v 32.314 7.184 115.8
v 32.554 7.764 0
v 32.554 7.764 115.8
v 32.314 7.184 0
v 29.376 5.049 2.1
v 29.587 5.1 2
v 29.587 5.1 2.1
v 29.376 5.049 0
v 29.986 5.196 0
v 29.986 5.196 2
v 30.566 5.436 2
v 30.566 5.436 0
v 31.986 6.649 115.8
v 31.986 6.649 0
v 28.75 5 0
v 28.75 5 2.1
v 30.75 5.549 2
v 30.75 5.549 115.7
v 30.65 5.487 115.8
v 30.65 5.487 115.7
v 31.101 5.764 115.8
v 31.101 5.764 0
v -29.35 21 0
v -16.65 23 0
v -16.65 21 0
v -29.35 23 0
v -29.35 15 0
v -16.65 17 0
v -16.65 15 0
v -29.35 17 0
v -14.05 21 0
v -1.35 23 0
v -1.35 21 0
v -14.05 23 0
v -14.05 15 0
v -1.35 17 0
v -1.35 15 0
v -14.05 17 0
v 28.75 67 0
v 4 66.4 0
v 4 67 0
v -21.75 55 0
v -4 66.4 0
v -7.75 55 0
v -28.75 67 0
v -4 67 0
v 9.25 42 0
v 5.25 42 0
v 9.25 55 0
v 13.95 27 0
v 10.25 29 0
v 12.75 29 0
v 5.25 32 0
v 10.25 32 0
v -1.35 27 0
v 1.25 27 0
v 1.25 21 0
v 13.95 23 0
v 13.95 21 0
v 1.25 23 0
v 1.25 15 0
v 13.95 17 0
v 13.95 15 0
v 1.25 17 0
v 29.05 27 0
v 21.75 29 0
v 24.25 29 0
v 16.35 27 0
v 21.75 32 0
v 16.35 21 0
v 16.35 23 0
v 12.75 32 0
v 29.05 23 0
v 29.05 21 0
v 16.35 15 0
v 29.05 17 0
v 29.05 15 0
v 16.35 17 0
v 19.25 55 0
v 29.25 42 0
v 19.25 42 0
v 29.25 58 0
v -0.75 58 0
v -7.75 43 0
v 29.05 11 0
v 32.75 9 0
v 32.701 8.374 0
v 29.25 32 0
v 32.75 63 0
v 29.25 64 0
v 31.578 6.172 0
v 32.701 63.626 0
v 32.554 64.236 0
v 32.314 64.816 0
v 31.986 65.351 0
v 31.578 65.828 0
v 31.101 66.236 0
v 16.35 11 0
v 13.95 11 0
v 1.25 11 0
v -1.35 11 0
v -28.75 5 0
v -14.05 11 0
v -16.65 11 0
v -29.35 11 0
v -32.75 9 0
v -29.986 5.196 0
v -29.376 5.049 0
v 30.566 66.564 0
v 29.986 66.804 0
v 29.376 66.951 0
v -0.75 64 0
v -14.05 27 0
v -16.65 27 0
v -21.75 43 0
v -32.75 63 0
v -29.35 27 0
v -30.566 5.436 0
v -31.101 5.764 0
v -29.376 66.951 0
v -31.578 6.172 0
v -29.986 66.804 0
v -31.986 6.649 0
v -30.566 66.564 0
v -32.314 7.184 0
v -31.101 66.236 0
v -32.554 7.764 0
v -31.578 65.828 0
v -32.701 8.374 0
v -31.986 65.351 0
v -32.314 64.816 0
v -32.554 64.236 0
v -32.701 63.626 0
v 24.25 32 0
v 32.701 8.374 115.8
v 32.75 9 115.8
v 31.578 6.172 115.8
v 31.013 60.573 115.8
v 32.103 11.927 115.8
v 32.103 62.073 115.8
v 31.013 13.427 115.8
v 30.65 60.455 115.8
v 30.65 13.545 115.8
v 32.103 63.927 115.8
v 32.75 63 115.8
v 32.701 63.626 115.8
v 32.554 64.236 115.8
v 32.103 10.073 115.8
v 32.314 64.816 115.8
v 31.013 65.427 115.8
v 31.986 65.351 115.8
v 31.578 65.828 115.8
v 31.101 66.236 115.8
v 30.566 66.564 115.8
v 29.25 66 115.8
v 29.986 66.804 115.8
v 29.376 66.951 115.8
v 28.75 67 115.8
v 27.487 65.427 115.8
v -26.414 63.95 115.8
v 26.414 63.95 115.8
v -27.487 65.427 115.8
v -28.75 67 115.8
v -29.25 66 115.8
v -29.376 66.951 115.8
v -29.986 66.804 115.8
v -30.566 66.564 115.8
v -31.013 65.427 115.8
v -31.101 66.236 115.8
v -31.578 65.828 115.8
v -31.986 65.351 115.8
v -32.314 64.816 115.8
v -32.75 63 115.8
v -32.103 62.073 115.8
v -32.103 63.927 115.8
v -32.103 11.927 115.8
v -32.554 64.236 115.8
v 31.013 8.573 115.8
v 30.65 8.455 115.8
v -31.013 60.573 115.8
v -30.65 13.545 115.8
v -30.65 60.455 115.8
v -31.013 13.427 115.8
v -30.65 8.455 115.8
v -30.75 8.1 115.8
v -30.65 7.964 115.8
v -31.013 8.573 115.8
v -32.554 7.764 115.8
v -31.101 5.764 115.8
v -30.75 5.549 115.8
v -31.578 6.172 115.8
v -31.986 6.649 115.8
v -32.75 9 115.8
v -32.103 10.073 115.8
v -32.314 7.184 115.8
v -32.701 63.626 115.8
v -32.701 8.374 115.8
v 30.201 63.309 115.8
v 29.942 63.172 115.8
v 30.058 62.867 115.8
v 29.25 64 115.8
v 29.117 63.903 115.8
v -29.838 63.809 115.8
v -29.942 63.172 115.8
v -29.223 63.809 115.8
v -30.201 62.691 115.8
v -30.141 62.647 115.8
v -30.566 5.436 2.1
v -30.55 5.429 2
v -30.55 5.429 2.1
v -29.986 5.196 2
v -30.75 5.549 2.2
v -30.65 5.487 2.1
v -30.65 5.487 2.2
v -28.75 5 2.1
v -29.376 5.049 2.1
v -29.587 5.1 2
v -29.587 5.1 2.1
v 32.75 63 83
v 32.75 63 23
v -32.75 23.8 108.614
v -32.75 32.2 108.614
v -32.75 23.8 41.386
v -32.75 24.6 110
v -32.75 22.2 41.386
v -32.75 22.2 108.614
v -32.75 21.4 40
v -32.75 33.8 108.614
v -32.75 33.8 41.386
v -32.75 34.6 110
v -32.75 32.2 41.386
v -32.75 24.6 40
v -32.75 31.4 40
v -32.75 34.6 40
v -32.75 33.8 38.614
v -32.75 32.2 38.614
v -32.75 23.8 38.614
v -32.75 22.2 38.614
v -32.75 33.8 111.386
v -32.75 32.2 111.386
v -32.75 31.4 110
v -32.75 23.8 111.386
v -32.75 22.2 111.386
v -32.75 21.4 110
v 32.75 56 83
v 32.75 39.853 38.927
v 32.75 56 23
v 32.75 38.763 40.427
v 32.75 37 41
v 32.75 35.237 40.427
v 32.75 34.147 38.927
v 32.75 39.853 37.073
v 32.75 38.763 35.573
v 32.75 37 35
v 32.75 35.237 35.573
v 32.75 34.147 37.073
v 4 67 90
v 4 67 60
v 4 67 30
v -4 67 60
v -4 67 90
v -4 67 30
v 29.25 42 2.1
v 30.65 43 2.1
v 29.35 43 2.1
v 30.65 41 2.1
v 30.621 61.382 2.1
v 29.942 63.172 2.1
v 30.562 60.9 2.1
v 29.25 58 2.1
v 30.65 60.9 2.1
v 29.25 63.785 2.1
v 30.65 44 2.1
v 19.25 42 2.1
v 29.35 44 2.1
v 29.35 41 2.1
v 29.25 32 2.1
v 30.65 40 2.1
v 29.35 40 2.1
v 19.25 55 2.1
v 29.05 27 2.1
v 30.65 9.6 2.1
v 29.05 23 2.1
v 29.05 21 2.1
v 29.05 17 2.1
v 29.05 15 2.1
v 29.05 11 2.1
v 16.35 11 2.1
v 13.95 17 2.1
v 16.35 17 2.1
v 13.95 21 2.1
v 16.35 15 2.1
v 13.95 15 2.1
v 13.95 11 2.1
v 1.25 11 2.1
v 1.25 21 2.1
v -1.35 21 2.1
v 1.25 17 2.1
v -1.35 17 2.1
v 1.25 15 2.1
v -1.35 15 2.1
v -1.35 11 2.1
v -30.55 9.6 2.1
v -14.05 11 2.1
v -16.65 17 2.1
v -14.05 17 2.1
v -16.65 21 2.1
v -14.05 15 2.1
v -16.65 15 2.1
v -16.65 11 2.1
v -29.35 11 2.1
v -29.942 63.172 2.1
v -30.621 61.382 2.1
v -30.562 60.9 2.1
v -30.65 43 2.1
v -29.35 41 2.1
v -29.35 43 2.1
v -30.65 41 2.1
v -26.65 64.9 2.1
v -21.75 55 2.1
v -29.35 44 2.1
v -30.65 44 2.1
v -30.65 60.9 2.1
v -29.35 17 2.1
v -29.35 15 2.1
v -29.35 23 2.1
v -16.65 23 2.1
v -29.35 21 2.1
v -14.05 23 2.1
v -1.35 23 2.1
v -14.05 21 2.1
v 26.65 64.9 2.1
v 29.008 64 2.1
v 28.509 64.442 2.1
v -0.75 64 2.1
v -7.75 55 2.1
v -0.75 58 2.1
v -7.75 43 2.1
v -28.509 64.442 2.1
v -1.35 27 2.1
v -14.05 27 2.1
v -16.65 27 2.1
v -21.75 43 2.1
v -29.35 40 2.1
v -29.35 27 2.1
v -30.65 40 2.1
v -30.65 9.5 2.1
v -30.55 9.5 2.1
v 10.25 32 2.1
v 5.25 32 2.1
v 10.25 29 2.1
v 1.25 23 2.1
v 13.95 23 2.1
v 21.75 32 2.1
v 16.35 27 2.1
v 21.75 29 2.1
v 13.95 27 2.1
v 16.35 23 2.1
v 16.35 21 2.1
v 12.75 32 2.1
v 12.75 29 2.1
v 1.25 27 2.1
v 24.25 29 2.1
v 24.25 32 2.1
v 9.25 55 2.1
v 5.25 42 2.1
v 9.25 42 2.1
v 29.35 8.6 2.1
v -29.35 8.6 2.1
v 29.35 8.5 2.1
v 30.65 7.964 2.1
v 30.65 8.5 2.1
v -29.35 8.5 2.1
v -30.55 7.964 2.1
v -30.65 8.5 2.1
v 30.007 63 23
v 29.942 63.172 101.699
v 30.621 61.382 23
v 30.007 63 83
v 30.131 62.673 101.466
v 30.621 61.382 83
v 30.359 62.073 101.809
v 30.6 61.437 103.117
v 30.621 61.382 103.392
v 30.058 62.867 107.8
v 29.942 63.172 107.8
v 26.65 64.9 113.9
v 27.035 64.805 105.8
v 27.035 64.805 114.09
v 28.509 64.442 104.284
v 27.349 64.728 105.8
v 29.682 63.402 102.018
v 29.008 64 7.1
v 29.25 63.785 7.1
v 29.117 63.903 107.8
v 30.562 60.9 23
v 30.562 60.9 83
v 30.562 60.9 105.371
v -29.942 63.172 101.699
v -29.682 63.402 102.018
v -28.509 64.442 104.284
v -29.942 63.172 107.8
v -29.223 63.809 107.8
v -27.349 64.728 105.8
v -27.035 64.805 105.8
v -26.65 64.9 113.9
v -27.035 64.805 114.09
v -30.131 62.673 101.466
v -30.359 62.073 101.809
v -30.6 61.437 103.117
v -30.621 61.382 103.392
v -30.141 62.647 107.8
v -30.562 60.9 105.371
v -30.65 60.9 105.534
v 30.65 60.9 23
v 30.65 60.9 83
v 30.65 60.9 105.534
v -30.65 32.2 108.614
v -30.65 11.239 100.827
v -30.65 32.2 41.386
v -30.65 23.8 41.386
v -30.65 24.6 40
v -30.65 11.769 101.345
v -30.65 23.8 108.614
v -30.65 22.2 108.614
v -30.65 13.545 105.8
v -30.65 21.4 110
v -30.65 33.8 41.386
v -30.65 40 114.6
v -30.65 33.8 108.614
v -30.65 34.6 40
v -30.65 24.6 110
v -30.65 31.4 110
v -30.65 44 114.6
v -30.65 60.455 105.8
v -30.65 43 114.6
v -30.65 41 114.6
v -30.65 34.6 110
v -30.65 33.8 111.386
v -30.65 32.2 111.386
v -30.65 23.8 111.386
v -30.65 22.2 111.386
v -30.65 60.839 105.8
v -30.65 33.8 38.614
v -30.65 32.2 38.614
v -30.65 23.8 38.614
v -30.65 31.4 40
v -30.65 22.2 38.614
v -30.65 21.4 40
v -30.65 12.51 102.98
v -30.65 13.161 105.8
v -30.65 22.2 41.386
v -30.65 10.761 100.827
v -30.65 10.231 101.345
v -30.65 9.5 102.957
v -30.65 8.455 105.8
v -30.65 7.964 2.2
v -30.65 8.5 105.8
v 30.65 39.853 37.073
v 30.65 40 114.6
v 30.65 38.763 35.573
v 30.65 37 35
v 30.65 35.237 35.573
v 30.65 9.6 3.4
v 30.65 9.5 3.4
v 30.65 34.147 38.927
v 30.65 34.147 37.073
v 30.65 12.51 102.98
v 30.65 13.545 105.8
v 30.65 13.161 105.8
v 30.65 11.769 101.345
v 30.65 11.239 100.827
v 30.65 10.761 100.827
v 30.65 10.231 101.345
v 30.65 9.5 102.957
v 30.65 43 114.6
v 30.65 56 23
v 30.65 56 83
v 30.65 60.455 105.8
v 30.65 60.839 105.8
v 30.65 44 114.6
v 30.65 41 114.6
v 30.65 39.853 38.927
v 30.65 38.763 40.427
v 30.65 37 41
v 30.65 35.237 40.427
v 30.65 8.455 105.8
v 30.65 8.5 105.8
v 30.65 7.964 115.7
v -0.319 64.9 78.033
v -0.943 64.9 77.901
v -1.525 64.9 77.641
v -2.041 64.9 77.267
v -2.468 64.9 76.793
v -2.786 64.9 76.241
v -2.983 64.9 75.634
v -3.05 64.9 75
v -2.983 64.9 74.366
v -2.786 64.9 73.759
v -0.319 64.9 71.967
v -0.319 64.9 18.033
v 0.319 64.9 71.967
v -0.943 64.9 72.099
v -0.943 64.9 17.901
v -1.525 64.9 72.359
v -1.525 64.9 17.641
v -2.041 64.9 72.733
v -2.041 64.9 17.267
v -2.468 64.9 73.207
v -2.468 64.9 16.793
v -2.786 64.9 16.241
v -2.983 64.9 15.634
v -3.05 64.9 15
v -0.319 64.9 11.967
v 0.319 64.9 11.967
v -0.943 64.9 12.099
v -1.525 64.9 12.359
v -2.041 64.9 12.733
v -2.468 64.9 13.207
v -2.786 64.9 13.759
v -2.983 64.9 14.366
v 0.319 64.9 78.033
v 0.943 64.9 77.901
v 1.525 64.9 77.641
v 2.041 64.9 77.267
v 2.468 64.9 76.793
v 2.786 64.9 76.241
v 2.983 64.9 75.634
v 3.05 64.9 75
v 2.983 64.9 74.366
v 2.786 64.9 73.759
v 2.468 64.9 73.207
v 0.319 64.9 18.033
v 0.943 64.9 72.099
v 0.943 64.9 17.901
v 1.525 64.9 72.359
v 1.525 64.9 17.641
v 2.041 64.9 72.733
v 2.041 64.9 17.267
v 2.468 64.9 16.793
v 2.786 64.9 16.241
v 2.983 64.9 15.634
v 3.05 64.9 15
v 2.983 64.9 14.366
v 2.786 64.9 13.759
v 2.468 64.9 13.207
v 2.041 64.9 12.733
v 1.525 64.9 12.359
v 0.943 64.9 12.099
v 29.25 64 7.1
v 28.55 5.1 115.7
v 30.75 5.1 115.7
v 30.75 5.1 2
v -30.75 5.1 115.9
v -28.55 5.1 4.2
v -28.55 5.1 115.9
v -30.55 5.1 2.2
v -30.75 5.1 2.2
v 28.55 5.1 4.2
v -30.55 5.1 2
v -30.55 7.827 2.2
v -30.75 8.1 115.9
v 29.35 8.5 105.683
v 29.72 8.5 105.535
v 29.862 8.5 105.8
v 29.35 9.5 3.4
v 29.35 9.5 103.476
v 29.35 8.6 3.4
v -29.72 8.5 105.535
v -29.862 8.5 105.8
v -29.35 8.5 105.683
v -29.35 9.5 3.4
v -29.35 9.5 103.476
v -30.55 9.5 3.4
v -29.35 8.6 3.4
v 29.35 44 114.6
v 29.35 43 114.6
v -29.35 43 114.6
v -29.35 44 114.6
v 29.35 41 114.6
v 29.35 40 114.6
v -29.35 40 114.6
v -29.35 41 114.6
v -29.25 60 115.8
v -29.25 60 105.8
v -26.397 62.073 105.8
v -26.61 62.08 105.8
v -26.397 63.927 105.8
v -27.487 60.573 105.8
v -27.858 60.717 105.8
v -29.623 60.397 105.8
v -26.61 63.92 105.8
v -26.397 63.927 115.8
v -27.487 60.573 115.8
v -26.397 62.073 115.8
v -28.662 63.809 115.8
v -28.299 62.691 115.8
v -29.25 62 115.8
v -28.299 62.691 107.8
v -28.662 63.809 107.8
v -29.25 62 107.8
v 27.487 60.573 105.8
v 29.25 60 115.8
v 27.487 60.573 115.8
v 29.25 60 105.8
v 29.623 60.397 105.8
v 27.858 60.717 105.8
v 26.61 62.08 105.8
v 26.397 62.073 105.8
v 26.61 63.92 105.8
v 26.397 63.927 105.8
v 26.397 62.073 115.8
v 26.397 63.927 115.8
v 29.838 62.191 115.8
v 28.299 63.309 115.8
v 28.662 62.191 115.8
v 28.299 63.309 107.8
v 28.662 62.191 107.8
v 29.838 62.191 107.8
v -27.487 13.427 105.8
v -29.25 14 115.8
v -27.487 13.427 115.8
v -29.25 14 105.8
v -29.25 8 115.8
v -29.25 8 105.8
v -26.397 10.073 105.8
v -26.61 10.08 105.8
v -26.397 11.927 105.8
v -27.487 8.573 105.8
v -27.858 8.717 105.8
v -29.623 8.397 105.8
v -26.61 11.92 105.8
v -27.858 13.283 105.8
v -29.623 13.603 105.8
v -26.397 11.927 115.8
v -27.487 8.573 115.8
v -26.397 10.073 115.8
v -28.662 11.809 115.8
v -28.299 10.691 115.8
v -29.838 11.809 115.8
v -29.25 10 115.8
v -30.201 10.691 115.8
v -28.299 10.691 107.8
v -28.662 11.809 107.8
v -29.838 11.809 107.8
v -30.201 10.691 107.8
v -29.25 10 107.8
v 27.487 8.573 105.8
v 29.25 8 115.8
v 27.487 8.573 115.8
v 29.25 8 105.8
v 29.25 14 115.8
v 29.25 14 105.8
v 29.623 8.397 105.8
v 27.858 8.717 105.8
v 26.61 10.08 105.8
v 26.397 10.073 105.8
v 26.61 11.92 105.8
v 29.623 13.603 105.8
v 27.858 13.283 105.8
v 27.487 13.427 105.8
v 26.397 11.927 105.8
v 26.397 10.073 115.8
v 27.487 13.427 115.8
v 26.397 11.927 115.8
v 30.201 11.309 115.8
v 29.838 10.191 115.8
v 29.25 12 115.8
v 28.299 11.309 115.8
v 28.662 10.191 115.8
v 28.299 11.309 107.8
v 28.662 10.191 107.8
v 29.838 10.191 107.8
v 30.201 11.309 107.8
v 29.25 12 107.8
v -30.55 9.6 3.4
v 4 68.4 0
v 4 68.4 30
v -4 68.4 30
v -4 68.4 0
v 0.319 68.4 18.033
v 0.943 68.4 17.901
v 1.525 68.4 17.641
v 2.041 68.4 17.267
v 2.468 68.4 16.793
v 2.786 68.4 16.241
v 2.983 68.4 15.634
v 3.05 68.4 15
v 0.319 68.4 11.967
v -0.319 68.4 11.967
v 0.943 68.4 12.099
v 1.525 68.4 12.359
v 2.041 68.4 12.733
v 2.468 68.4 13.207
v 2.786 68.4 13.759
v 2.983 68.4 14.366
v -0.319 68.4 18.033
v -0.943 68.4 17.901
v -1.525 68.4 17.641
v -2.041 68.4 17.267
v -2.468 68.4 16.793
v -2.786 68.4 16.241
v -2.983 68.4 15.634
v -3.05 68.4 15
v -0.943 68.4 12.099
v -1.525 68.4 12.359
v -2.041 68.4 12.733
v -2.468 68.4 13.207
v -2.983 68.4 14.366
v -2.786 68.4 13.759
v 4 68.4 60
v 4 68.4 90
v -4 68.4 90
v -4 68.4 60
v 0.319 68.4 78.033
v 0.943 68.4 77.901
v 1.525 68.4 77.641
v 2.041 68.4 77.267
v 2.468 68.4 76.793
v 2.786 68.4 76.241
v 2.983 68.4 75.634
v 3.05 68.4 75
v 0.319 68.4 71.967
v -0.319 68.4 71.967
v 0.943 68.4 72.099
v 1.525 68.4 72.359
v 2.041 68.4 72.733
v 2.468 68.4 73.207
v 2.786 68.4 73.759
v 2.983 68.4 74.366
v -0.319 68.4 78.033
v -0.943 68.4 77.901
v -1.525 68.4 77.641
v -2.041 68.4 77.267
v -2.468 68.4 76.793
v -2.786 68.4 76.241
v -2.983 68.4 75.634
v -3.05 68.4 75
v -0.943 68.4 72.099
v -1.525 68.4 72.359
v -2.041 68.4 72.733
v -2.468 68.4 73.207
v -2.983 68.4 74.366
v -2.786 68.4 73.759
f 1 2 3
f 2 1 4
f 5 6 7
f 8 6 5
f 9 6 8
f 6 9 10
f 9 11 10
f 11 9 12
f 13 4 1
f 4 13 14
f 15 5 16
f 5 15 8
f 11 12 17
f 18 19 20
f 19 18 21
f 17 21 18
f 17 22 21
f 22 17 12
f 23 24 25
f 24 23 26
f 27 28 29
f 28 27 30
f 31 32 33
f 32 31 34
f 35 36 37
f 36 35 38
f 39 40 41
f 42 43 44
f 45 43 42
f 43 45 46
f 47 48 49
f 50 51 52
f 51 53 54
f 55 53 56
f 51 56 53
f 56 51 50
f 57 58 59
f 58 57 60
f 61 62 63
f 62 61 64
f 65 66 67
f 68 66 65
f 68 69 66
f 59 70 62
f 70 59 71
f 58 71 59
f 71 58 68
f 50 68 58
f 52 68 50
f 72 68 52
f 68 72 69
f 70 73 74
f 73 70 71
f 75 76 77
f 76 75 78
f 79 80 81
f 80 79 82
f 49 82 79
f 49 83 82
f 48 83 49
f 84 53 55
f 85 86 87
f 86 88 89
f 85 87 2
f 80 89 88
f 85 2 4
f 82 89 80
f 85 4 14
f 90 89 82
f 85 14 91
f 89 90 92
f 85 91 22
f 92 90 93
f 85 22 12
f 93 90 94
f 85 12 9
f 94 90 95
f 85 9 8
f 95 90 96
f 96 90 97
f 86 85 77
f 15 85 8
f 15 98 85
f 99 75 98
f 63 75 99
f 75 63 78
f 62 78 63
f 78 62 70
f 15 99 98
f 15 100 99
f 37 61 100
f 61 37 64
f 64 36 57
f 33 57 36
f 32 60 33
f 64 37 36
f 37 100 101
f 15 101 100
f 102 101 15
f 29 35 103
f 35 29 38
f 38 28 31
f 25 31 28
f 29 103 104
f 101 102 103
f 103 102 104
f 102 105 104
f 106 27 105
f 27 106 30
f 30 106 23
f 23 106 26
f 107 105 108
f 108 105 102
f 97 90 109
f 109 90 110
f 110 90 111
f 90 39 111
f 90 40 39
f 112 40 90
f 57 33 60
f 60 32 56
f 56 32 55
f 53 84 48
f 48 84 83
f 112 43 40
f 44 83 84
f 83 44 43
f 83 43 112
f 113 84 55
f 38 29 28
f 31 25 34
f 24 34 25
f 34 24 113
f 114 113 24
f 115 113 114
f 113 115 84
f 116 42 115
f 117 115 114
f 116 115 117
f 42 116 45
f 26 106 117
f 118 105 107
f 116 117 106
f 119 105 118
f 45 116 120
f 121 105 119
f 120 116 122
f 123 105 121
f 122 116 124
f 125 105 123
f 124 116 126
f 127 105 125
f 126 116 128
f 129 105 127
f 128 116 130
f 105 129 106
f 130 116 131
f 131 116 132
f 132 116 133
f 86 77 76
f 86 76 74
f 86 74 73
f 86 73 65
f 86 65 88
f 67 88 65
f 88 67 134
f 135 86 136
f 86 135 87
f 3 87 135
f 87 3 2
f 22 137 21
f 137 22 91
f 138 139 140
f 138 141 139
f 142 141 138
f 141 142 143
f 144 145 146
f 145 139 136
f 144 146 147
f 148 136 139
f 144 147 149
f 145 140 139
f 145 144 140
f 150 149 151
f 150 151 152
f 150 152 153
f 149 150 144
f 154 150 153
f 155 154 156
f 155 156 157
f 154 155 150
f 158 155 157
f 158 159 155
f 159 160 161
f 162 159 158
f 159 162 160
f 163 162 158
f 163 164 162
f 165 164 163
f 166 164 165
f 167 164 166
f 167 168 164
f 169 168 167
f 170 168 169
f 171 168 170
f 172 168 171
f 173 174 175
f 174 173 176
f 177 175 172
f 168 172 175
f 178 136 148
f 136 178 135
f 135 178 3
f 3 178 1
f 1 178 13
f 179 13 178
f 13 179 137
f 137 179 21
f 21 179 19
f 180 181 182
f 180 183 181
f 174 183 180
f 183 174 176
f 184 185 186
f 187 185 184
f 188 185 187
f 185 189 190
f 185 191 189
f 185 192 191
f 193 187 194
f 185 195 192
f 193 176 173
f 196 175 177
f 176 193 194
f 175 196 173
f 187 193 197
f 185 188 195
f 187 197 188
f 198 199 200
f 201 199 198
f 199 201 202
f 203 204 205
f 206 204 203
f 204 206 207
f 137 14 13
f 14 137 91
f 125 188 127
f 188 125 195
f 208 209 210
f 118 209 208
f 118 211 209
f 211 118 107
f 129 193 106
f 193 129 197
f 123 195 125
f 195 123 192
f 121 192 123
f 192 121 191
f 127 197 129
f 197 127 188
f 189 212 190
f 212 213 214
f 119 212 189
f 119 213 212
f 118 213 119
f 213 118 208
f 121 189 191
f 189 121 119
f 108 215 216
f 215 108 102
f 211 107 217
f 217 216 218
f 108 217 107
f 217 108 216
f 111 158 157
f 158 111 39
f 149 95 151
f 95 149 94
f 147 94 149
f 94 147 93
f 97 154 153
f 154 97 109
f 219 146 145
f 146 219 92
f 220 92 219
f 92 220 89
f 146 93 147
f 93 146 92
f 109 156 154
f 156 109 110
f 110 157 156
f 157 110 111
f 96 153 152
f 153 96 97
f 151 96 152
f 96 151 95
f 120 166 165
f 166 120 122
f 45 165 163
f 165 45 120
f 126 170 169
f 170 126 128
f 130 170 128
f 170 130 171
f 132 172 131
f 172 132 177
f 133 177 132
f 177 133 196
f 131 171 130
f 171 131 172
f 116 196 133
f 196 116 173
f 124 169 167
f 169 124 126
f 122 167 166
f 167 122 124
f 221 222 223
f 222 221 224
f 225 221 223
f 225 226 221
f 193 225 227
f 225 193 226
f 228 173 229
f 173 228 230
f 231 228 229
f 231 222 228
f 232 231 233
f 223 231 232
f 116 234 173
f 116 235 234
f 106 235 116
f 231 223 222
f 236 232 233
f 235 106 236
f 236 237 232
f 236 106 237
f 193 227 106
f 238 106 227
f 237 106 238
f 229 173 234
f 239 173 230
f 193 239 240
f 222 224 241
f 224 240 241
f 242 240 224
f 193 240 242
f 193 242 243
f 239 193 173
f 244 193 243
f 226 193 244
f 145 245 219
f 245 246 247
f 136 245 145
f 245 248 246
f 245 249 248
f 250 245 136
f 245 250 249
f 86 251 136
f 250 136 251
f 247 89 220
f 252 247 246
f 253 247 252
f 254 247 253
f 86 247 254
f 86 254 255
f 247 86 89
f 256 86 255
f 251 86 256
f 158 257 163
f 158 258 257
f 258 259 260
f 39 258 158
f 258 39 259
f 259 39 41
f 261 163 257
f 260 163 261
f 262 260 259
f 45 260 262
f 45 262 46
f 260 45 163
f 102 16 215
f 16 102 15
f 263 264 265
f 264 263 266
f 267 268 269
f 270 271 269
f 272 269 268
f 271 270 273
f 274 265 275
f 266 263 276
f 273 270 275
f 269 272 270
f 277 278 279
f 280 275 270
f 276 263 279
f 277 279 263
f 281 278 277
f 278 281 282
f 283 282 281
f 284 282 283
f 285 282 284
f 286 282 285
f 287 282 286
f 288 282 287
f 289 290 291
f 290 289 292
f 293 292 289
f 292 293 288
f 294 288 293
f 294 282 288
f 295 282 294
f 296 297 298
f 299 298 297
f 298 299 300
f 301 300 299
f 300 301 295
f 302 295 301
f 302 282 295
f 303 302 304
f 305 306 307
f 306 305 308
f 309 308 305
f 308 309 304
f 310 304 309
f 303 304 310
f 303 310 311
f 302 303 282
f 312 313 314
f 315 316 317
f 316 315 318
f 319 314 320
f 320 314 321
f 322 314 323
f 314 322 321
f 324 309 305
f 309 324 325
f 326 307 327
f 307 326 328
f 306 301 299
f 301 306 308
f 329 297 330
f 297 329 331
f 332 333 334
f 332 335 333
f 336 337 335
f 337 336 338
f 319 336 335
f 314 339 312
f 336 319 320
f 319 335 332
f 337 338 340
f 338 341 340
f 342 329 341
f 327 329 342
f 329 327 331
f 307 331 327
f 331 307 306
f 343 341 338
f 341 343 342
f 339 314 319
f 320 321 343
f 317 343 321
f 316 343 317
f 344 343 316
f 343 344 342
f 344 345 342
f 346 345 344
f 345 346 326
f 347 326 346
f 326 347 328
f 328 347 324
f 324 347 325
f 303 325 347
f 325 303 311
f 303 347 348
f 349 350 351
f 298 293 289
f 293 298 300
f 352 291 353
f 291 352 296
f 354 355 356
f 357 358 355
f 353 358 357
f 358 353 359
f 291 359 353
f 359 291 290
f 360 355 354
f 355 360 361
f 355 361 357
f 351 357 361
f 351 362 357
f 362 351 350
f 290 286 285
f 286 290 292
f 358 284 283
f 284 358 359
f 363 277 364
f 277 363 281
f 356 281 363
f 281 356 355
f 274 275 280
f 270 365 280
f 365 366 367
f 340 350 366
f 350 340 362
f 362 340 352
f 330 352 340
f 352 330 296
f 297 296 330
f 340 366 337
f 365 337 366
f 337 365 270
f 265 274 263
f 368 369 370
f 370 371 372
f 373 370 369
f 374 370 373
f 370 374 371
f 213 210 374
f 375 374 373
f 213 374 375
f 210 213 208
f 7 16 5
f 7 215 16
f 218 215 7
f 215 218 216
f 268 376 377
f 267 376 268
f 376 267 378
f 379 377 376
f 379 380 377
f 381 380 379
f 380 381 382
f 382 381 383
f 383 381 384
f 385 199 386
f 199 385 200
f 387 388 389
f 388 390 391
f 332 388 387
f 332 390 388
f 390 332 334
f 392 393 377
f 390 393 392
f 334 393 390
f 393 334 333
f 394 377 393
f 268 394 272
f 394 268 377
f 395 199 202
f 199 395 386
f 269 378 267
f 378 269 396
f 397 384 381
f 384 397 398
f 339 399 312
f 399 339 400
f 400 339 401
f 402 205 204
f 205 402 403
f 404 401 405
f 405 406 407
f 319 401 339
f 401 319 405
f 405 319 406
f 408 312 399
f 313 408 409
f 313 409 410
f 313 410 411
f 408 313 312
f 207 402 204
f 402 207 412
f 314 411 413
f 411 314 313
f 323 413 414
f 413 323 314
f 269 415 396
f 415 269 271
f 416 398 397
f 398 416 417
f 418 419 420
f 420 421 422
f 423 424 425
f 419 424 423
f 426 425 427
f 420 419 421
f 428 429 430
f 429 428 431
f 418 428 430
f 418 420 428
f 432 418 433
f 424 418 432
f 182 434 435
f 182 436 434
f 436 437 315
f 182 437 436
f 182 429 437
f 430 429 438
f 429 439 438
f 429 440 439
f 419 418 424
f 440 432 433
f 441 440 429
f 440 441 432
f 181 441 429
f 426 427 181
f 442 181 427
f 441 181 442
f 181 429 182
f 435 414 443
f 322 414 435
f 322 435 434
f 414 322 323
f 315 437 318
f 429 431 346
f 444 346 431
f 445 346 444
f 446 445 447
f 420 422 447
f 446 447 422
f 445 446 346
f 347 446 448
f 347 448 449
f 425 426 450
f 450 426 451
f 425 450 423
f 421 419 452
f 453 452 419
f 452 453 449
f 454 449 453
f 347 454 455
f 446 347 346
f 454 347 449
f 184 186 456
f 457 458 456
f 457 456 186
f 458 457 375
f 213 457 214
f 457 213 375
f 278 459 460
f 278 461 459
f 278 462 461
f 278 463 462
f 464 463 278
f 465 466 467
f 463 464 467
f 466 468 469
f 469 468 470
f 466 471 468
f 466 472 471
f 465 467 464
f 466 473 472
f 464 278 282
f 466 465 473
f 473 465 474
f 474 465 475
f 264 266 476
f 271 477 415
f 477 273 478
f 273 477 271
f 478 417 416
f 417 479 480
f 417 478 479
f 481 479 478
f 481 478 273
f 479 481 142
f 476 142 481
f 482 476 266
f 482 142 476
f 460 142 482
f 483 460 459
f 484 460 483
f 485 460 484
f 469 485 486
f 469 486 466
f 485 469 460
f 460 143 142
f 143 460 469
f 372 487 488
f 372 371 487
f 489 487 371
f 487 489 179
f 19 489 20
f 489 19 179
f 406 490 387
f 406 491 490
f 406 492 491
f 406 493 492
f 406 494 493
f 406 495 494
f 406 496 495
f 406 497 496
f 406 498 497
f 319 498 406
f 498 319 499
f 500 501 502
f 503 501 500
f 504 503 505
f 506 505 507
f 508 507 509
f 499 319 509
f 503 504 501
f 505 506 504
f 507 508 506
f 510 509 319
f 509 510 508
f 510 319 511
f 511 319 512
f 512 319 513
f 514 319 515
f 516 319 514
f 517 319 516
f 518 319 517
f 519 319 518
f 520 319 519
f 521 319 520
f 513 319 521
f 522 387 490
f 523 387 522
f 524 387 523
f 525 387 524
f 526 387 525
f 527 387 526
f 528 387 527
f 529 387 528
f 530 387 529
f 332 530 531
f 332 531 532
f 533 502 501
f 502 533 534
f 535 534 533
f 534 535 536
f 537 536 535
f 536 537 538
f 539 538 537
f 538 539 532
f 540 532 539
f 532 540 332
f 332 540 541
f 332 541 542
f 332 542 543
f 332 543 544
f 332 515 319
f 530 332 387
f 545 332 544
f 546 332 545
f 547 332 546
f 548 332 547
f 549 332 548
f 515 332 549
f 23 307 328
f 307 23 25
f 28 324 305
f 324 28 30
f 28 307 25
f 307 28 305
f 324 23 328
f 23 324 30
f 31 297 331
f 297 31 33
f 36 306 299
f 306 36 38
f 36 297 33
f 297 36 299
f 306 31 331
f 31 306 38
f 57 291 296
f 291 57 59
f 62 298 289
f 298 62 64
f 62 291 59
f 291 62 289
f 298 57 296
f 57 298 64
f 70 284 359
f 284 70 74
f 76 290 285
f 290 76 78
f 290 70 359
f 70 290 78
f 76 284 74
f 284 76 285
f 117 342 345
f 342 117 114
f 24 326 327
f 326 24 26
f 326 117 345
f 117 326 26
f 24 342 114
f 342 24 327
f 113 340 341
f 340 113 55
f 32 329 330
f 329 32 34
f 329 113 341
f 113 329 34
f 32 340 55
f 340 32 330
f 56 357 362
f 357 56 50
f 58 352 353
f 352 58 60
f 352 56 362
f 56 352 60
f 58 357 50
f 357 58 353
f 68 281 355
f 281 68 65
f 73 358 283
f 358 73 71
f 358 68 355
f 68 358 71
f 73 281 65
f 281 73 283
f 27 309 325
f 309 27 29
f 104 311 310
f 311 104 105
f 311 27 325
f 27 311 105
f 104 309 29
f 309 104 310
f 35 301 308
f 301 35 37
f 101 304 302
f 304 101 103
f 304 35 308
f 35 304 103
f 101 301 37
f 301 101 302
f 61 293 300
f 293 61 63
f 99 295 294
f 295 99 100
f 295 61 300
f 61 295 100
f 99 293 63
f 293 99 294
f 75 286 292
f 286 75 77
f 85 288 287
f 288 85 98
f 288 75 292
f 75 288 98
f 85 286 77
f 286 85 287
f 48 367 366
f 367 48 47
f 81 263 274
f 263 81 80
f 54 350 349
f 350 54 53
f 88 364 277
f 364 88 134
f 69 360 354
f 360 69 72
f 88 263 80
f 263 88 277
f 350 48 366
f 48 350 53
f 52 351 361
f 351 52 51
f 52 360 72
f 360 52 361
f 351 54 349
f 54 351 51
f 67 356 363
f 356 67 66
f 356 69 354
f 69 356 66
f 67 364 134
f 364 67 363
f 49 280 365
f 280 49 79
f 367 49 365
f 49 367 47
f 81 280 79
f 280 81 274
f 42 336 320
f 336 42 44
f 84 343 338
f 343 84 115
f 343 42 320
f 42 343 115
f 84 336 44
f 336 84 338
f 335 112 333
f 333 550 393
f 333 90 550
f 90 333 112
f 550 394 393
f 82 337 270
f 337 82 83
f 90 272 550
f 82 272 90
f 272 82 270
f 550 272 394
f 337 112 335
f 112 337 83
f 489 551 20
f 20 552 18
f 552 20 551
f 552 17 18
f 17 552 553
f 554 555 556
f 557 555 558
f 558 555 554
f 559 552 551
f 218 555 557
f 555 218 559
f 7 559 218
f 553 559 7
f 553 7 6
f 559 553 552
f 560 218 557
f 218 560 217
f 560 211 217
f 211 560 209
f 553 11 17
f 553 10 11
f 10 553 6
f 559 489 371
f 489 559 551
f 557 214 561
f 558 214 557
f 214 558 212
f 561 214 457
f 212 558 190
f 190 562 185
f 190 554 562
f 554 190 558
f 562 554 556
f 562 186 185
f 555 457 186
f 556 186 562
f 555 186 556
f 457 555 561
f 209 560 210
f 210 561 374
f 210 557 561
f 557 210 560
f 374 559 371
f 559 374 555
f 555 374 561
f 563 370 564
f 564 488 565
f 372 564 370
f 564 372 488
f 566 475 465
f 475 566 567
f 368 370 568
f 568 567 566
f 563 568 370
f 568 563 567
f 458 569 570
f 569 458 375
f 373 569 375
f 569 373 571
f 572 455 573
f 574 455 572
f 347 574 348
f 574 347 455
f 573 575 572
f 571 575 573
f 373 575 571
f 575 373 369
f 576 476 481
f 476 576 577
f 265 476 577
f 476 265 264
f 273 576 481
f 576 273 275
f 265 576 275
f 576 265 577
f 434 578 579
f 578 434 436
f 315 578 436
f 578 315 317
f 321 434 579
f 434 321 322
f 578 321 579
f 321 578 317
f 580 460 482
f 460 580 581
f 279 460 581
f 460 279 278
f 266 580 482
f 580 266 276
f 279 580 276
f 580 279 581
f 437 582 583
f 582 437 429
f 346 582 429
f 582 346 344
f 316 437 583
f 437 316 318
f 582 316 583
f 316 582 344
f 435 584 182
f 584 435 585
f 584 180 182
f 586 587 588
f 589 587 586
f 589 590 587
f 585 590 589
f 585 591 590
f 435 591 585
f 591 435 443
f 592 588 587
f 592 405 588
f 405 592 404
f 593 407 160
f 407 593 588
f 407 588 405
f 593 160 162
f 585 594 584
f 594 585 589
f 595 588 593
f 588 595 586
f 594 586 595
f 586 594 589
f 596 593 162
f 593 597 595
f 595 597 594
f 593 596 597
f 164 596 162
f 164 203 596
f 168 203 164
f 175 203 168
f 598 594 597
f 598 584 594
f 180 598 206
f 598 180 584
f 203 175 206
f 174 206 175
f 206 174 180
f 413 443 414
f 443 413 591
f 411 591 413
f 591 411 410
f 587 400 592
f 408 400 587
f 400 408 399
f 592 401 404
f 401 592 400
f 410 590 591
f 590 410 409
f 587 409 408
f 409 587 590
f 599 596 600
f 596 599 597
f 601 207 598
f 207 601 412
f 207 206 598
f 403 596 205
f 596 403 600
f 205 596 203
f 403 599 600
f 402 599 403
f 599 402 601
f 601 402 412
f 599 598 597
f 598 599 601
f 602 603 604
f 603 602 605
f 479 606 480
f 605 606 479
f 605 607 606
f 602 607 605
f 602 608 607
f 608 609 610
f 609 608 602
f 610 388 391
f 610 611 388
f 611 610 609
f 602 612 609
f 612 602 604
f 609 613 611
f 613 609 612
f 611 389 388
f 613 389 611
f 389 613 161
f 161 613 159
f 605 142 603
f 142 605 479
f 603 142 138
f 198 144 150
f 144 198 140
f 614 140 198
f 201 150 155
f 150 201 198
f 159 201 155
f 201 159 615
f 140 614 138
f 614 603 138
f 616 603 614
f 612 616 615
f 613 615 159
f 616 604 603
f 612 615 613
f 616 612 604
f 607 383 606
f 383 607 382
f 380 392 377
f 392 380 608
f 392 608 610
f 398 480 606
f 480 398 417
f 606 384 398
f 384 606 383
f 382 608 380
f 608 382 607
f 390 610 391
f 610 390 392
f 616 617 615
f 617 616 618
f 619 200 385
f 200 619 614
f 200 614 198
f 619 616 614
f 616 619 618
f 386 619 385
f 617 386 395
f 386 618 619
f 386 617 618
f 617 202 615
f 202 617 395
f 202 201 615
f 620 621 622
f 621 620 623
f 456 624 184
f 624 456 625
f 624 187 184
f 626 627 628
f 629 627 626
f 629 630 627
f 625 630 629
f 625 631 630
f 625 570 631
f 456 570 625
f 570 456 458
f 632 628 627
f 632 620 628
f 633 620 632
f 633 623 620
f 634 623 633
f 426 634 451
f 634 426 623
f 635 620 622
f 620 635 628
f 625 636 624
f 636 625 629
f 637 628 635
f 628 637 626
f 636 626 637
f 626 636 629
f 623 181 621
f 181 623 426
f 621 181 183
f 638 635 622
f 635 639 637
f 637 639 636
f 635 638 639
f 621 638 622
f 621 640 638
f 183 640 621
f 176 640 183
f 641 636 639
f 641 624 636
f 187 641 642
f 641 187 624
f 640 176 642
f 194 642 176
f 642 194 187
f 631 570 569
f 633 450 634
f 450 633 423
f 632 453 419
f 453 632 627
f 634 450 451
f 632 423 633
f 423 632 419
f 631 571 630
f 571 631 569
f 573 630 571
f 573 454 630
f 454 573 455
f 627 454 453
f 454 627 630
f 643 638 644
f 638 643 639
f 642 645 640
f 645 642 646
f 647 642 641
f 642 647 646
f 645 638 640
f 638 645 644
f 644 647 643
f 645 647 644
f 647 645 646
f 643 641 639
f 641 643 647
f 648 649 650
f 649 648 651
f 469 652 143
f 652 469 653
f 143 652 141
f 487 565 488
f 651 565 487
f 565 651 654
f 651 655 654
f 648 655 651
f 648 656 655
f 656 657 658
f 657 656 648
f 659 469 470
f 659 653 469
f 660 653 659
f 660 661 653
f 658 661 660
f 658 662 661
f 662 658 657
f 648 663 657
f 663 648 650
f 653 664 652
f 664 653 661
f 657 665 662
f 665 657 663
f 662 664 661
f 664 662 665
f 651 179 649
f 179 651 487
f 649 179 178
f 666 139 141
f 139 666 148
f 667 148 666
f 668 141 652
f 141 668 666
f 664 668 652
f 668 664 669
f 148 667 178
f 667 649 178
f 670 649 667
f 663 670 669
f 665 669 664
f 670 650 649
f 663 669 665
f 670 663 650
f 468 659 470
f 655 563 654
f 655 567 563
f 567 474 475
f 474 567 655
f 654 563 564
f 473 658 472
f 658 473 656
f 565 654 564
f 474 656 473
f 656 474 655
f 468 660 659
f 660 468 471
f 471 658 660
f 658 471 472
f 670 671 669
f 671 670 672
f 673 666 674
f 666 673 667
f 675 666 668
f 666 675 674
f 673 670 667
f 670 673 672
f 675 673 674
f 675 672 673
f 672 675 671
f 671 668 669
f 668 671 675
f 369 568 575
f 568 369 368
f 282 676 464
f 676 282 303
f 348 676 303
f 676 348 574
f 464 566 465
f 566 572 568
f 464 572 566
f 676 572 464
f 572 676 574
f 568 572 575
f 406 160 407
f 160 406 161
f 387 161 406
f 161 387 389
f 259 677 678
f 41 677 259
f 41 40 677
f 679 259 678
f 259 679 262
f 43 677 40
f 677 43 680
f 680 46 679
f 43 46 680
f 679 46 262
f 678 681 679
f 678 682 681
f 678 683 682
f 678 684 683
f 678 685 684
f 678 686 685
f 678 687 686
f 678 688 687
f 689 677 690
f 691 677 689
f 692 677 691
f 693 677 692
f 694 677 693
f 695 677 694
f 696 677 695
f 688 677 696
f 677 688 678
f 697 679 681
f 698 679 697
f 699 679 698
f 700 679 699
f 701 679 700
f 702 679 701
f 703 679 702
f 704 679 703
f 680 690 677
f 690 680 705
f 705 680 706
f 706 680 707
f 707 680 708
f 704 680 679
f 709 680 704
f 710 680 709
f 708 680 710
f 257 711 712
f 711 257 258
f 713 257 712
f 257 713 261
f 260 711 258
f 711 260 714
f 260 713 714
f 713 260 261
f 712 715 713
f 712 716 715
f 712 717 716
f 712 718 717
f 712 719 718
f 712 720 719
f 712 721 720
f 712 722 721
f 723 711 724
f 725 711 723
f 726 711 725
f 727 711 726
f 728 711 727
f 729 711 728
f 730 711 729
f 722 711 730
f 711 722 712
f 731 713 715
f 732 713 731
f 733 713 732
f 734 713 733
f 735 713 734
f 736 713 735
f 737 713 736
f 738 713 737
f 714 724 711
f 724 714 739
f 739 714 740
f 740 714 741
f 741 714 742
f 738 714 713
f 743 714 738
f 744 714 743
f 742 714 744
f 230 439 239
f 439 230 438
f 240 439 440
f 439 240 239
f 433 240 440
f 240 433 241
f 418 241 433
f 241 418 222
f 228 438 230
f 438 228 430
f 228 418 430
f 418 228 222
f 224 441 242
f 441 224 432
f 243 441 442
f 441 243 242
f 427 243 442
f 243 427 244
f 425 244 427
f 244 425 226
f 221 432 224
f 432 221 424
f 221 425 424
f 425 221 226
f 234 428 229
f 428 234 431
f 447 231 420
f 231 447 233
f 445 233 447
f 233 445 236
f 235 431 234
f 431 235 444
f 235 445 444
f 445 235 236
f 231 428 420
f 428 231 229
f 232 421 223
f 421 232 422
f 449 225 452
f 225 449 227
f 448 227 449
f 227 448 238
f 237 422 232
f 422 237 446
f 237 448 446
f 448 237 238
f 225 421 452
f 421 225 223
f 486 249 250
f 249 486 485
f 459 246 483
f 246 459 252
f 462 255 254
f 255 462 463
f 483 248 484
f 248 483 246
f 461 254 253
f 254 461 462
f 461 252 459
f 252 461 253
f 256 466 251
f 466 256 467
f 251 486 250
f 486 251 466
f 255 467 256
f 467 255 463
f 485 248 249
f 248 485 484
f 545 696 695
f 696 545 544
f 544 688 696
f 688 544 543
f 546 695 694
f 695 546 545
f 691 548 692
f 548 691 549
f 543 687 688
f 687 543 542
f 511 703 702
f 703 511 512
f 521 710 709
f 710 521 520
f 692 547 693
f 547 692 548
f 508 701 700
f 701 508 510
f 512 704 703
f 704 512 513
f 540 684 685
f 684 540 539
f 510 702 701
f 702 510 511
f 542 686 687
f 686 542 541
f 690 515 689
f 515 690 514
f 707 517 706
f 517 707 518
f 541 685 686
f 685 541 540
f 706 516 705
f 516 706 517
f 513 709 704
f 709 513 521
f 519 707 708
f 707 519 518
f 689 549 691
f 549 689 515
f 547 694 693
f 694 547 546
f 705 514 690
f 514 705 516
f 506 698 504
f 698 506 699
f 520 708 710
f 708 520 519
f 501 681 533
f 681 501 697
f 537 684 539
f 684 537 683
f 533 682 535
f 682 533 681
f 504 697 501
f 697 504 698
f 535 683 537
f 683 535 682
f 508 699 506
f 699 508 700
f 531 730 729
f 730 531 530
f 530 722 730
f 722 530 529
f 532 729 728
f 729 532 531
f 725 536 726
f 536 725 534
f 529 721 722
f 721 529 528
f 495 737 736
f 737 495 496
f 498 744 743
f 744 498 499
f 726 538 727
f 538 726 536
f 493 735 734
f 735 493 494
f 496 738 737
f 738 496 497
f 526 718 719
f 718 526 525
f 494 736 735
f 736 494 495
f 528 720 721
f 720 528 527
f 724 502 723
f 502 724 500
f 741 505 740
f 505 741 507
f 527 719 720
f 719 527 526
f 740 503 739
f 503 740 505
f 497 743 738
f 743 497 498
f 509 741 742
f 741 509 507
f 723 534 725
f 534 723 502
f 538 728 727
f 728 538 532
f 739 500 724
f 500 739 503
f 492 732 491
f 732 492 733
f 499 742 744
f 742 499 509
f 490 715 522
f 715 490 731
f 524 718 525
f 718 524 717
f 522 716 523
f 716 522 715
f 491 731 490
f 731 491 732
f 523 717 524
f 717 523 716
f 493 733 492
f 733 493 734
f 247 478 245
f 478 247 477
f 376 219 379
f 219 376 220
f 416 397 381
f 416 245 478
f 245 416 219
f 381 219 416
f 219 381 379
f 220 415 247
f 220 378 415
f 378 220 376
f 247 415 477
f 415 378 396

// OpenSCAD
// Sliding Project box V1.2, now with screw holes!
// John Newman, 25th November 2011
// Edited by Martin Neruda (neruda@reprap4u.cz)

//
// A parameterised enclosure for electronic projects, with support for PCB slots, Screw holes and blocks
// and apertures in the lid and 'top' end.
// The lid slides on, which holds your PCB(s) in.
// Apertures are added with code in the modules "HoleInLid" and "HoleInEnd". See the comments.

// Outside dimensions of the box, and other structural dimensions

OutL = 120;		// Length in mm (puvodne 107)
OutW = 65.5 ; 	// Width in mm
OutD = 62	;		// Depth in mm
WallT = 2.1	;	// Wall thickness (mm)

// PCB supports are defined by the distance to the underside of the PCB, from the top external of the box.
// Supports for the PCB are ribs above and below
PCBgap = 2 ;	// Slot size for PCB to slide into
PCB1 = 38 ;		// Position of first PCB (0 if none)
PCB2 = 0;		// Position of second PCB (0 if none)
PCB3 = 0 ;		// Position of third PCB (0 if none)

// Screw fasteners are positioned by defining their centre , below the top external surface
// They will be positioned on either side at that height. You have to make sure they are not in a PCB slot!
Screws1 = 58 ;	// Position of screws
Screws2 = 6;	// Second set of screws
// Optionally specify the screw hole diameter, to have the holes 'printed'. Otherwise drill them...
ScrewH = 1.0 ;	// Screw hole diameter, in base
ScrewL = 0.0 ;	// Screw hole diameter, in lid

// More obscure parameters
BRad = 4 ;		// Radius of curvature, box edges (mm)
// For wide boxes (>50/60mm) you may want to use this, or make WallT larger for rigidity.
Ridge = 0.5;		// Depth of reinforcing ridge at end of base. 0 to suppress, is WallT multiplier. (not mm!) e.g 1.5

Sdepth = 1.0 ;	// Depth of support ribs for Lid and PCB (mm)
Swidth = 1.4;
// Bevelled ridge to hold lid on (in mm)
RHeight = 3 ;	// Top ridge height
RWidth = 2 ;	// Top ridge width (out over the box)
// Plastic blocks to screw into
ScrewD = 10 ;	// Depth of screw block (which the screw goes into)
ScrewW = 6 ;	// Width of Screw block, and of countersink in lid

Allow = 0.5;		// Allowance for fit of the lid. A gap around it, and elsewhere.


// *******************************  View / render options ********************************

// Print Box on on it's own
//translate([0,0,OutL/2-WallT]) rotate([0,-90,90]) pbox() ;  	// Rotate and position for printing

// Print Lid on it's own
//translate([0,0,OutD/2]) pboxlid() ;					// Rotate and position for printing


// Print both together (if they fit!)

//cover();
box();

module cover(){
difference(){
	union(){
		translate([0,-OutW/2-5,OutD/2]) pboxlid();
		translate([-OutL/2+2,-OutW+2,0]) cube([14,5,OutD-10]);		
	}
	translate([0,-9])union(){
		translate([-OutL/2-0.1,-13,OutD/2-20]) cube([10,10,20]);
		translate([-OutL/2-0.1,-13,OutD/2-10]) rotate([0,90,0])cylinder(h=10,r=10);
	}
}
}

module box(){
difference(){
	union(){
	translate([0,OutD/2+5,OutL/2-WallT]) rotate([0,-90,90]) pbox();
	translate([-4,OutD+2*WallT+0.2,0]) cube([8,2,30]);
	translate([-4,OutD+2*WallT+0.2,60]) cube([8,2,30]);
	}
	union(){
	  // Reset hole
	  translate([OutW/2-6,37,38]) rotate([0,90,0]) cylinder(h=10,r=3);
	  // Holes for Arduino Mega2560
	  translate([-OutW/2+6,OutD+6,0]) rotate([90,0,0]){
	  // Holes for zip ties
	  translate([-10,110,35]) rotate([0,90,0])
	  cylinder(h=10,r=1.6);
	  translate([-10,110,45]) rotate([0,90,0])
	  cylinder(h=10,r=1.6);
	  translate([-10,40,35]) rotate([0,90,0])
	  cylinder(h=10,r=1.6);
	  translate([-10,40,45]) rotate([0,90,0])
	  cylinder(h=10,r=1.6);
	}
	// Mounting holes
	translate([0,OutD,15]) rotate([-90,0,0]) cylinder(r = 3.05, h = 20, $fn = 30);
	translate([0,OutD,75]) rotate([-90,0,0]) cylinder(r = 3.05, h = 20, $fn = 30);	
	// Hole for X motor and endstop cables
	translate([0,OutD+1,OutD/2-8]) rotate([90,0,0]) cube([50,60,7]);
	}
}
}

// ***************  Your modules to add apertures to  ***************************

// These two modules are where you can put function calls to create holes
// You should use the functions shown in comments, where the
// parameters are in measured from the top left (outside dimension) when looking at the surface (ext).
// Do a test, you'll see how it goes.
// X is across, Y is down, W is x width, D is y depth.

// Called by pboxlid to make any required holes in the lid face
module HoleInLid() {
//	lidround(x,y,w);		// for round holes, X & Y give the centre
//	lidrect(x,y,w,d);		// for rectangular holes, X & Y give the top left corner
// Vent slots	
for (i = [15: 8 : 95] )
{
	lidrect(OutW/2-13/2,i,13,4);
	lidrect(OutW/2-13/2-13-4,i,13,4);
	lidrect(OutW/2-13/2+13+4,i,13,4);
}
	lidrect(OutW/2-13/2,7,13,4);
	lidrect(OutW/2-13/2,103,13,4);
}


// Called by pbox to make any required holes in the end of the box
module HoleInEnd() {
//	endround(x,y,w);		// for round holes, X & Y give the centre
//	endrect(x,y,w,d);		// for rectangular holes, X & Y give the top left corner
	endrect(38,27,24,10); // Power connector
	endrect(43,24,2.5,4) ; // 'teeth'
	endrect(54.5,24,2.5,4) ;
	endrect(42,36,10,14) ; // DC socket
	endrect(11,38,14,12); // USB connector

   // Vent slots
   translate([0,0,0]) {
	endrect(3.4,12,12.7,4);
	endrect(18.7,12,12.7,4);
	endrect(34,12,12.7,4);
	endrect(49.1,12,12.7,4);

	endrect(3.4,18,12.7,4);
	endrect(18.7,18,12.7,4);
	endrect(34,18,12.7,4);
	endrect(49.1,18,12.7,4);

	endrect(3.4,6,12.7,4);
	endrect(18.7,6,12.7,4);
	endrect(34,6,12.7,4);
	endrect(49.1,6,12.7,4);
	}

	// Hole for Y, Z motor and endstop cables
	endrect(32,53,30,6);

}


// **************** Main Box and Lib modules  *************************

// The Project Box
module pbox() {
	blen = OutL-WallT*2 ;		// Len of box w/o endplate
	rheight = WallT * Ridge ;	// Ridge height, if any
	slen = OutW-WallT*2+0.2  ;	// Lib support at end length
	union () {
		difference() {
			rotate ([0,90,0]) roundedBox(OutD,OutW,blen,BRad,$fn=40) ;
			translate([WallT*2,0,WallT*2]) rotate ([0,90,0]) roundedBox(OutD+(WallT*2),OutW-(WallT*2),OutL,BRad) ;
			HoleInEnd() ;
		}
		topridge() ;		// Add a ridge around the top to hold the lid on
		// Add support to hold the lid up at the sides
		support(OutD/2-RHeight-0.5) ;		
		// Support the end of the lid
		translate([-(OutL/2-WallT*2+0.1),OutW/2-WallT-0.1,OutD/2-RHeight-0.6-Sdepth]) rotate([0,0,-90]) cube([slen,Swidth,Sdepth]) ;
		// Optional reinforcing ridge
		if (Ridge != 0) {
			translate([OutL/2-WallT,-OutW/2+BRad,-OutD/2+WallT+rheight-0.1]) rotate([0,180,0]) halfslab(rheight*2,OutW-BRad*2,rheight) ;
		}
		if (PCB1 != 0) {
			support(OutD/2 - PCB1) ;	// Support under the PCB
			support(OutD/2 - (PCB1 - Sdepth - PCBgap)) ;	// Support over the PCB
		}
		if (PCB2 != 0) {
			support(OutD/2 - PCB2) ;	// Support under the PCB
			support(OutD/2 - (PCB2 - Sdepth - PCBgap)) ;	// Support over the PCB
		}
		if (PCB3 != 0) {
			support(OutD/2 - PCB3) ;	// Support under the PCB
			support(OutD/2 - (PCB3 - Sdepth - PCBgap)) ;	// Support over the PCB
		} 
		if (Screws1 != 0) {
			translate([OutL/2-WallT,OutW/2-ScrewW/2-Allow,OutD/2-Screws1]) rotate([0,-90,0]) sblock(ScrewW,ScrewH,ScrewD) ;
			translate([OutL/2-WallT,-(OutW/2-ScrewW/2)+Allow,OutD/2-Screws1]) rotate([0,90,180]) sblock(ScrewW,ScrewH,ScrewD) ;
		}
		if (Screws2 != 0) {
			translate([OutL/2-WallT,OutW/2-ScrewW/2-Allow,OutD/2-Screws2]) rotate([0,-90,0]) sblock(ScrewW,ScrewH,ScrewD) ;
			translate([OutL/2-WallT,-(OutW/2-ScrewW/2)+Allow,OutD/2-Screws2]) rotate([0,90,180]) sblock(ScrewW,ScrewH,ScrewD) ;
		}
	}
}

// Sliding lid for Box
module pboxlid() {
	wid = OutW-(WallT*2)-Allow ;
	dadj = Allow ;			// Depth adjustment of end plate, seems to help...
	union() {
		difference() {
			translate([0,0,0]) rotate ([0,90,0]) roundedBox(OutD-dadj,OutW,OutL,BRad) ;
			translate([-(OutL/2-WallT*2),-(OutW+5)/2,-(OutD/2+2.5)]) cube([OutL+5,OutW+5,OutD+5]) ;
			// Hollow out end plate
			//translate([-(OutL/2-WallT),-(OutW/2)+ScrewW+Allow+WallT,-(OutD/2)+0.1]) cube([10,OutW-(ScrewW+WallT+Allow)*2,OutD-WallT*3]) ;
			translate([-(OutL/2-WallT),-(OutW/2)+ScrewW+Allow,-(OutD/2)+0.1]) cube([10,OutW-(ScrewW+Allow)*2,OutD-WallT*3]) ;
			// Support wedge
			//translate([WallT*2-OutL/2+0.1,-(OutW/2)+ScrewW+Allow+WallT-0.1,OutD/2-WallT])
			//		rotate([0,180,0]) halfslab(WallT,OutW-(ScrewW+WallT+Allow-0.1)*2,WallT*2) ; 
			translate([WallT*2-OutL/2+0.1,-(OutW/2)+ScrewW+Allow-0.1,OutD/2-WallT])
					rotate([0,180,0]) halfslab(WallT,OutW-(ScrewW+Allow-0.1)*2,WallT*2) ; 
			// Screw countersinks as req
			if (Screws1 != 0) {
				translate([0.3-OutL/2,OutW/2-ScrewW/2-Allow,-OutD/2+Screws1]) rotate([0,90,0]) countersink() ;
				translate([0.3-OutL/2,-(OutW/2-ScrewW/2)+Allow,-OutD/2+Screws1]) rotate([0,90,0])  countersink() ;
			}
			if (Screws1 != 0 && ScrewL != 0) {
				translate([-(OutL/2 + 2),OutW/2-ScrewW/2-Allow,-OutD/2+Screws1])
					rotate([0,90,0]) cylinder(WallT*4,ScrewL/2,ScrewL/2,$fn=8) ;
				translate([-(OutL/2 + 2),-(OutW/2-ScrewW/2)+Allow,-OutD/2+Screws1])
					rotate([0,90,0]) cylinder(WallT*4,ScrewL/2,ScrewL/2,$fn=8) ;
			}
			if (Screws2 != 0) {
				translate([0.3-OutL/2,OutW/2-ScrewW/2-Allow,-OutD/2+Screws2]) rotate([0,90,0]) countersink() ;
				translate([0.3-OutL/2,-(OutW/2-ScrewW/2)+Allow,-OutD/2+Screws2]) rotate([0,90,0])  countersink() ;
			}
			if (Screws2 != 0 && ScrewL != 0) {
				translate([-(OutL/2 + 2),OutW/2-ScrewW/2-Allow,-OutD/2+Screws2])
					rotate([0,90,0]) cylinder(WallT*4,ScrewL/2,ScrewL/2,$fn=8) ;
				translate([-(OutL/2 + 2),-(OutW/2-ScrewW/2)+Allow,-OutD/2+Screws2]) 
					rotate([0,90,0]) cylinder(WallT*4,ScrewL/2,ScrewL/2,$fn=8) ;
			}
		}
		render() {
			translate([-(OutL/2-0.1),0,-OutD/2+RHeight]) rotate([180,0,0]) platform(RHeight,wid,wid-(RWidth*2),OutL-WallT-Allow) ;
		}
	}
}

// ****************** Worker modules  ************************

module countersink() {
	difference() {
		union() {
			cylinder(WallT,ScrewW/2,1) ;
			translate([0,0,-(WallT-0.1)]) cylinder(WallT,ScrewW/2,ScrewW/2) ;
		}
	}
}

// Platform bevelled on three sides
// Parameters are height, width at base, width at top and length
module platform(h,wb,wt,l) {
	difference() {
		polyhedron (points=[[0,-(wb/2),0],[l,-(wb/2),0],[l,(wb/2),0],[0,(wb/2),0], [0,-(wt/2),h],[l,-(wt/2),h],[l,(wt/2),h],[0,(wt/2),h] ], 
			triangles=[[0,1,5],[0,5,4],[1,2,6],[1,6,5],[2,3,7],[2,7,6],[0,4,7],[0,7,3],[4,5,6],[4,6,7],[3,2,1],[3,1,0],]) ;
		translate([l/2-(RWidth+Allow),0,h/2-WallT]) cube([l,wt-1,h],true) ;
		translate([l-RWidth,-(OutW/2+4),RHeight]) rotate([0,90,0]) halfslab(RHeight,OutW+8,RWidth) ;
		HoleInLid() ;			// Call user code for aperature
	}
}

// Block for Screws
module sblock(outs,ins,len) { 
	cone = 20 ;
	outr = outs/2 - 1.8;
	inr = ins/2 ;
	outL = outr * 0.87;
	outS = outr/2 ;
	inL = inr * 0.87 ;
	inS = inr /2 ;
	difference() {
		union() {
			cylinder(len,outs/2,outs/2) ;
			translate([0,0,len-((sin(cone)*outs/2))]) rotate([-cone,0,0],[0,0,len]) cylinder((outs/2)/tan(cone),outs/2,0) ;
		}
		if (ins !=0) {
			translate([0,0,-2]) cylinder(h=10,r=1);
		}
	}
}


// size is a vector [w, h, d]
module roundedBox(width, height, depth, radius) {
	size=[width, height, depth];
	cube(size - [2*radius,0,0], true);
	cube(size - [0,2*radius,0], true);
	for (x = [radius-size[0]/2, -radius+size[0]/2],
		y = [radius-size[1]/2, -radius+size[1]/2]) {
		translate([x,y,0]) cylinder(r=radius, h=size[2], center=true);
	}
}

//  Kind of triangle cross section beam w->X; d->Y; h->Z
module halfslab(w,d,h) {
	polyhedron ( points = [[0, 0, h], [0, d, h], [0, d, 0], [0, 0, 0], [w, 0, h], [w, d, h]], 
		triangles = [[0,3,2], [0,2,1], [3,0,4], [1,2,5], [0,5,4], [0,1,5],  [5,2,4], [4,2,3], ]);
}

// Top ridge which retains the lid
module topridge() {
	blen = 0 ;
	translate([(OutL-WallT*2)/2-0.1, -(OutW/2-WallT+0.1),(OutD/2)-(RHeight+0.1)]) rotate([0,0,90]) halfslab(RWidth+0.2, OutL-(WallT*3), RHeight ) ;
	translate([-(OutL-WallT*4)/2+0.1, (OutW/2-WallT+0.1),(OutD/2)-(RHeight+0.1)]) rotate([0,0,-90]) halfslab(RWidth+0.2, OutL-(WallT*3), RHeight ) ;

	translate([-(OutL/2-WallT*2+0.1),- (OutW/2-WallT+0.1),(OutD/2)-(RHeight+0.1)]) rotate([0,0,0]) halfslab(RWidth+0.2, OutW-(WallT*2), RHeight ) ;
}

// Support ridge for lid or PCB
module support(top) {
	translate([0,-(OutW/2-(WallT-0.1)),top]) rib() ;
	translate([0,(OutW/2-(WallT-0.1)-Swidth),top]) rib() ;
}

//Rib of support
module rib() {
	len = OutL - (WallT*3) - Allow ;			// Allow for 1 wall thickness at one end, 2 at the other, and an Allowance
	translate([-len/2 +0.1,0,-Sdepth]) cube([len,Swidth,Sdepth]) ;
}

module endround(x,y,w) {
	translate([-(10+OutL-WallT*4)/2,OutW/2-x,OutD/2-y]) rotate([0,90,0]) cylinder(10,w/2,w/2) ;
}

module endrect(x,y,w,d) {
	translate([-(10+OutL-WallT*4)/2,OutW/2-w-x,OutD/2-y]) rotate([0,90,0]) cube([d,w,10]) ;
}

module lidround(x,y,w) {
	translate([OutL-y,OutW/2-x,-10]) cylinder(20,w/2,w/2) ;
}

module lidrect(x,y,w,d) {
	translate([OutL-d-y,OutW/2-w-x,-8]) cube([d,w,20]) ;
}
